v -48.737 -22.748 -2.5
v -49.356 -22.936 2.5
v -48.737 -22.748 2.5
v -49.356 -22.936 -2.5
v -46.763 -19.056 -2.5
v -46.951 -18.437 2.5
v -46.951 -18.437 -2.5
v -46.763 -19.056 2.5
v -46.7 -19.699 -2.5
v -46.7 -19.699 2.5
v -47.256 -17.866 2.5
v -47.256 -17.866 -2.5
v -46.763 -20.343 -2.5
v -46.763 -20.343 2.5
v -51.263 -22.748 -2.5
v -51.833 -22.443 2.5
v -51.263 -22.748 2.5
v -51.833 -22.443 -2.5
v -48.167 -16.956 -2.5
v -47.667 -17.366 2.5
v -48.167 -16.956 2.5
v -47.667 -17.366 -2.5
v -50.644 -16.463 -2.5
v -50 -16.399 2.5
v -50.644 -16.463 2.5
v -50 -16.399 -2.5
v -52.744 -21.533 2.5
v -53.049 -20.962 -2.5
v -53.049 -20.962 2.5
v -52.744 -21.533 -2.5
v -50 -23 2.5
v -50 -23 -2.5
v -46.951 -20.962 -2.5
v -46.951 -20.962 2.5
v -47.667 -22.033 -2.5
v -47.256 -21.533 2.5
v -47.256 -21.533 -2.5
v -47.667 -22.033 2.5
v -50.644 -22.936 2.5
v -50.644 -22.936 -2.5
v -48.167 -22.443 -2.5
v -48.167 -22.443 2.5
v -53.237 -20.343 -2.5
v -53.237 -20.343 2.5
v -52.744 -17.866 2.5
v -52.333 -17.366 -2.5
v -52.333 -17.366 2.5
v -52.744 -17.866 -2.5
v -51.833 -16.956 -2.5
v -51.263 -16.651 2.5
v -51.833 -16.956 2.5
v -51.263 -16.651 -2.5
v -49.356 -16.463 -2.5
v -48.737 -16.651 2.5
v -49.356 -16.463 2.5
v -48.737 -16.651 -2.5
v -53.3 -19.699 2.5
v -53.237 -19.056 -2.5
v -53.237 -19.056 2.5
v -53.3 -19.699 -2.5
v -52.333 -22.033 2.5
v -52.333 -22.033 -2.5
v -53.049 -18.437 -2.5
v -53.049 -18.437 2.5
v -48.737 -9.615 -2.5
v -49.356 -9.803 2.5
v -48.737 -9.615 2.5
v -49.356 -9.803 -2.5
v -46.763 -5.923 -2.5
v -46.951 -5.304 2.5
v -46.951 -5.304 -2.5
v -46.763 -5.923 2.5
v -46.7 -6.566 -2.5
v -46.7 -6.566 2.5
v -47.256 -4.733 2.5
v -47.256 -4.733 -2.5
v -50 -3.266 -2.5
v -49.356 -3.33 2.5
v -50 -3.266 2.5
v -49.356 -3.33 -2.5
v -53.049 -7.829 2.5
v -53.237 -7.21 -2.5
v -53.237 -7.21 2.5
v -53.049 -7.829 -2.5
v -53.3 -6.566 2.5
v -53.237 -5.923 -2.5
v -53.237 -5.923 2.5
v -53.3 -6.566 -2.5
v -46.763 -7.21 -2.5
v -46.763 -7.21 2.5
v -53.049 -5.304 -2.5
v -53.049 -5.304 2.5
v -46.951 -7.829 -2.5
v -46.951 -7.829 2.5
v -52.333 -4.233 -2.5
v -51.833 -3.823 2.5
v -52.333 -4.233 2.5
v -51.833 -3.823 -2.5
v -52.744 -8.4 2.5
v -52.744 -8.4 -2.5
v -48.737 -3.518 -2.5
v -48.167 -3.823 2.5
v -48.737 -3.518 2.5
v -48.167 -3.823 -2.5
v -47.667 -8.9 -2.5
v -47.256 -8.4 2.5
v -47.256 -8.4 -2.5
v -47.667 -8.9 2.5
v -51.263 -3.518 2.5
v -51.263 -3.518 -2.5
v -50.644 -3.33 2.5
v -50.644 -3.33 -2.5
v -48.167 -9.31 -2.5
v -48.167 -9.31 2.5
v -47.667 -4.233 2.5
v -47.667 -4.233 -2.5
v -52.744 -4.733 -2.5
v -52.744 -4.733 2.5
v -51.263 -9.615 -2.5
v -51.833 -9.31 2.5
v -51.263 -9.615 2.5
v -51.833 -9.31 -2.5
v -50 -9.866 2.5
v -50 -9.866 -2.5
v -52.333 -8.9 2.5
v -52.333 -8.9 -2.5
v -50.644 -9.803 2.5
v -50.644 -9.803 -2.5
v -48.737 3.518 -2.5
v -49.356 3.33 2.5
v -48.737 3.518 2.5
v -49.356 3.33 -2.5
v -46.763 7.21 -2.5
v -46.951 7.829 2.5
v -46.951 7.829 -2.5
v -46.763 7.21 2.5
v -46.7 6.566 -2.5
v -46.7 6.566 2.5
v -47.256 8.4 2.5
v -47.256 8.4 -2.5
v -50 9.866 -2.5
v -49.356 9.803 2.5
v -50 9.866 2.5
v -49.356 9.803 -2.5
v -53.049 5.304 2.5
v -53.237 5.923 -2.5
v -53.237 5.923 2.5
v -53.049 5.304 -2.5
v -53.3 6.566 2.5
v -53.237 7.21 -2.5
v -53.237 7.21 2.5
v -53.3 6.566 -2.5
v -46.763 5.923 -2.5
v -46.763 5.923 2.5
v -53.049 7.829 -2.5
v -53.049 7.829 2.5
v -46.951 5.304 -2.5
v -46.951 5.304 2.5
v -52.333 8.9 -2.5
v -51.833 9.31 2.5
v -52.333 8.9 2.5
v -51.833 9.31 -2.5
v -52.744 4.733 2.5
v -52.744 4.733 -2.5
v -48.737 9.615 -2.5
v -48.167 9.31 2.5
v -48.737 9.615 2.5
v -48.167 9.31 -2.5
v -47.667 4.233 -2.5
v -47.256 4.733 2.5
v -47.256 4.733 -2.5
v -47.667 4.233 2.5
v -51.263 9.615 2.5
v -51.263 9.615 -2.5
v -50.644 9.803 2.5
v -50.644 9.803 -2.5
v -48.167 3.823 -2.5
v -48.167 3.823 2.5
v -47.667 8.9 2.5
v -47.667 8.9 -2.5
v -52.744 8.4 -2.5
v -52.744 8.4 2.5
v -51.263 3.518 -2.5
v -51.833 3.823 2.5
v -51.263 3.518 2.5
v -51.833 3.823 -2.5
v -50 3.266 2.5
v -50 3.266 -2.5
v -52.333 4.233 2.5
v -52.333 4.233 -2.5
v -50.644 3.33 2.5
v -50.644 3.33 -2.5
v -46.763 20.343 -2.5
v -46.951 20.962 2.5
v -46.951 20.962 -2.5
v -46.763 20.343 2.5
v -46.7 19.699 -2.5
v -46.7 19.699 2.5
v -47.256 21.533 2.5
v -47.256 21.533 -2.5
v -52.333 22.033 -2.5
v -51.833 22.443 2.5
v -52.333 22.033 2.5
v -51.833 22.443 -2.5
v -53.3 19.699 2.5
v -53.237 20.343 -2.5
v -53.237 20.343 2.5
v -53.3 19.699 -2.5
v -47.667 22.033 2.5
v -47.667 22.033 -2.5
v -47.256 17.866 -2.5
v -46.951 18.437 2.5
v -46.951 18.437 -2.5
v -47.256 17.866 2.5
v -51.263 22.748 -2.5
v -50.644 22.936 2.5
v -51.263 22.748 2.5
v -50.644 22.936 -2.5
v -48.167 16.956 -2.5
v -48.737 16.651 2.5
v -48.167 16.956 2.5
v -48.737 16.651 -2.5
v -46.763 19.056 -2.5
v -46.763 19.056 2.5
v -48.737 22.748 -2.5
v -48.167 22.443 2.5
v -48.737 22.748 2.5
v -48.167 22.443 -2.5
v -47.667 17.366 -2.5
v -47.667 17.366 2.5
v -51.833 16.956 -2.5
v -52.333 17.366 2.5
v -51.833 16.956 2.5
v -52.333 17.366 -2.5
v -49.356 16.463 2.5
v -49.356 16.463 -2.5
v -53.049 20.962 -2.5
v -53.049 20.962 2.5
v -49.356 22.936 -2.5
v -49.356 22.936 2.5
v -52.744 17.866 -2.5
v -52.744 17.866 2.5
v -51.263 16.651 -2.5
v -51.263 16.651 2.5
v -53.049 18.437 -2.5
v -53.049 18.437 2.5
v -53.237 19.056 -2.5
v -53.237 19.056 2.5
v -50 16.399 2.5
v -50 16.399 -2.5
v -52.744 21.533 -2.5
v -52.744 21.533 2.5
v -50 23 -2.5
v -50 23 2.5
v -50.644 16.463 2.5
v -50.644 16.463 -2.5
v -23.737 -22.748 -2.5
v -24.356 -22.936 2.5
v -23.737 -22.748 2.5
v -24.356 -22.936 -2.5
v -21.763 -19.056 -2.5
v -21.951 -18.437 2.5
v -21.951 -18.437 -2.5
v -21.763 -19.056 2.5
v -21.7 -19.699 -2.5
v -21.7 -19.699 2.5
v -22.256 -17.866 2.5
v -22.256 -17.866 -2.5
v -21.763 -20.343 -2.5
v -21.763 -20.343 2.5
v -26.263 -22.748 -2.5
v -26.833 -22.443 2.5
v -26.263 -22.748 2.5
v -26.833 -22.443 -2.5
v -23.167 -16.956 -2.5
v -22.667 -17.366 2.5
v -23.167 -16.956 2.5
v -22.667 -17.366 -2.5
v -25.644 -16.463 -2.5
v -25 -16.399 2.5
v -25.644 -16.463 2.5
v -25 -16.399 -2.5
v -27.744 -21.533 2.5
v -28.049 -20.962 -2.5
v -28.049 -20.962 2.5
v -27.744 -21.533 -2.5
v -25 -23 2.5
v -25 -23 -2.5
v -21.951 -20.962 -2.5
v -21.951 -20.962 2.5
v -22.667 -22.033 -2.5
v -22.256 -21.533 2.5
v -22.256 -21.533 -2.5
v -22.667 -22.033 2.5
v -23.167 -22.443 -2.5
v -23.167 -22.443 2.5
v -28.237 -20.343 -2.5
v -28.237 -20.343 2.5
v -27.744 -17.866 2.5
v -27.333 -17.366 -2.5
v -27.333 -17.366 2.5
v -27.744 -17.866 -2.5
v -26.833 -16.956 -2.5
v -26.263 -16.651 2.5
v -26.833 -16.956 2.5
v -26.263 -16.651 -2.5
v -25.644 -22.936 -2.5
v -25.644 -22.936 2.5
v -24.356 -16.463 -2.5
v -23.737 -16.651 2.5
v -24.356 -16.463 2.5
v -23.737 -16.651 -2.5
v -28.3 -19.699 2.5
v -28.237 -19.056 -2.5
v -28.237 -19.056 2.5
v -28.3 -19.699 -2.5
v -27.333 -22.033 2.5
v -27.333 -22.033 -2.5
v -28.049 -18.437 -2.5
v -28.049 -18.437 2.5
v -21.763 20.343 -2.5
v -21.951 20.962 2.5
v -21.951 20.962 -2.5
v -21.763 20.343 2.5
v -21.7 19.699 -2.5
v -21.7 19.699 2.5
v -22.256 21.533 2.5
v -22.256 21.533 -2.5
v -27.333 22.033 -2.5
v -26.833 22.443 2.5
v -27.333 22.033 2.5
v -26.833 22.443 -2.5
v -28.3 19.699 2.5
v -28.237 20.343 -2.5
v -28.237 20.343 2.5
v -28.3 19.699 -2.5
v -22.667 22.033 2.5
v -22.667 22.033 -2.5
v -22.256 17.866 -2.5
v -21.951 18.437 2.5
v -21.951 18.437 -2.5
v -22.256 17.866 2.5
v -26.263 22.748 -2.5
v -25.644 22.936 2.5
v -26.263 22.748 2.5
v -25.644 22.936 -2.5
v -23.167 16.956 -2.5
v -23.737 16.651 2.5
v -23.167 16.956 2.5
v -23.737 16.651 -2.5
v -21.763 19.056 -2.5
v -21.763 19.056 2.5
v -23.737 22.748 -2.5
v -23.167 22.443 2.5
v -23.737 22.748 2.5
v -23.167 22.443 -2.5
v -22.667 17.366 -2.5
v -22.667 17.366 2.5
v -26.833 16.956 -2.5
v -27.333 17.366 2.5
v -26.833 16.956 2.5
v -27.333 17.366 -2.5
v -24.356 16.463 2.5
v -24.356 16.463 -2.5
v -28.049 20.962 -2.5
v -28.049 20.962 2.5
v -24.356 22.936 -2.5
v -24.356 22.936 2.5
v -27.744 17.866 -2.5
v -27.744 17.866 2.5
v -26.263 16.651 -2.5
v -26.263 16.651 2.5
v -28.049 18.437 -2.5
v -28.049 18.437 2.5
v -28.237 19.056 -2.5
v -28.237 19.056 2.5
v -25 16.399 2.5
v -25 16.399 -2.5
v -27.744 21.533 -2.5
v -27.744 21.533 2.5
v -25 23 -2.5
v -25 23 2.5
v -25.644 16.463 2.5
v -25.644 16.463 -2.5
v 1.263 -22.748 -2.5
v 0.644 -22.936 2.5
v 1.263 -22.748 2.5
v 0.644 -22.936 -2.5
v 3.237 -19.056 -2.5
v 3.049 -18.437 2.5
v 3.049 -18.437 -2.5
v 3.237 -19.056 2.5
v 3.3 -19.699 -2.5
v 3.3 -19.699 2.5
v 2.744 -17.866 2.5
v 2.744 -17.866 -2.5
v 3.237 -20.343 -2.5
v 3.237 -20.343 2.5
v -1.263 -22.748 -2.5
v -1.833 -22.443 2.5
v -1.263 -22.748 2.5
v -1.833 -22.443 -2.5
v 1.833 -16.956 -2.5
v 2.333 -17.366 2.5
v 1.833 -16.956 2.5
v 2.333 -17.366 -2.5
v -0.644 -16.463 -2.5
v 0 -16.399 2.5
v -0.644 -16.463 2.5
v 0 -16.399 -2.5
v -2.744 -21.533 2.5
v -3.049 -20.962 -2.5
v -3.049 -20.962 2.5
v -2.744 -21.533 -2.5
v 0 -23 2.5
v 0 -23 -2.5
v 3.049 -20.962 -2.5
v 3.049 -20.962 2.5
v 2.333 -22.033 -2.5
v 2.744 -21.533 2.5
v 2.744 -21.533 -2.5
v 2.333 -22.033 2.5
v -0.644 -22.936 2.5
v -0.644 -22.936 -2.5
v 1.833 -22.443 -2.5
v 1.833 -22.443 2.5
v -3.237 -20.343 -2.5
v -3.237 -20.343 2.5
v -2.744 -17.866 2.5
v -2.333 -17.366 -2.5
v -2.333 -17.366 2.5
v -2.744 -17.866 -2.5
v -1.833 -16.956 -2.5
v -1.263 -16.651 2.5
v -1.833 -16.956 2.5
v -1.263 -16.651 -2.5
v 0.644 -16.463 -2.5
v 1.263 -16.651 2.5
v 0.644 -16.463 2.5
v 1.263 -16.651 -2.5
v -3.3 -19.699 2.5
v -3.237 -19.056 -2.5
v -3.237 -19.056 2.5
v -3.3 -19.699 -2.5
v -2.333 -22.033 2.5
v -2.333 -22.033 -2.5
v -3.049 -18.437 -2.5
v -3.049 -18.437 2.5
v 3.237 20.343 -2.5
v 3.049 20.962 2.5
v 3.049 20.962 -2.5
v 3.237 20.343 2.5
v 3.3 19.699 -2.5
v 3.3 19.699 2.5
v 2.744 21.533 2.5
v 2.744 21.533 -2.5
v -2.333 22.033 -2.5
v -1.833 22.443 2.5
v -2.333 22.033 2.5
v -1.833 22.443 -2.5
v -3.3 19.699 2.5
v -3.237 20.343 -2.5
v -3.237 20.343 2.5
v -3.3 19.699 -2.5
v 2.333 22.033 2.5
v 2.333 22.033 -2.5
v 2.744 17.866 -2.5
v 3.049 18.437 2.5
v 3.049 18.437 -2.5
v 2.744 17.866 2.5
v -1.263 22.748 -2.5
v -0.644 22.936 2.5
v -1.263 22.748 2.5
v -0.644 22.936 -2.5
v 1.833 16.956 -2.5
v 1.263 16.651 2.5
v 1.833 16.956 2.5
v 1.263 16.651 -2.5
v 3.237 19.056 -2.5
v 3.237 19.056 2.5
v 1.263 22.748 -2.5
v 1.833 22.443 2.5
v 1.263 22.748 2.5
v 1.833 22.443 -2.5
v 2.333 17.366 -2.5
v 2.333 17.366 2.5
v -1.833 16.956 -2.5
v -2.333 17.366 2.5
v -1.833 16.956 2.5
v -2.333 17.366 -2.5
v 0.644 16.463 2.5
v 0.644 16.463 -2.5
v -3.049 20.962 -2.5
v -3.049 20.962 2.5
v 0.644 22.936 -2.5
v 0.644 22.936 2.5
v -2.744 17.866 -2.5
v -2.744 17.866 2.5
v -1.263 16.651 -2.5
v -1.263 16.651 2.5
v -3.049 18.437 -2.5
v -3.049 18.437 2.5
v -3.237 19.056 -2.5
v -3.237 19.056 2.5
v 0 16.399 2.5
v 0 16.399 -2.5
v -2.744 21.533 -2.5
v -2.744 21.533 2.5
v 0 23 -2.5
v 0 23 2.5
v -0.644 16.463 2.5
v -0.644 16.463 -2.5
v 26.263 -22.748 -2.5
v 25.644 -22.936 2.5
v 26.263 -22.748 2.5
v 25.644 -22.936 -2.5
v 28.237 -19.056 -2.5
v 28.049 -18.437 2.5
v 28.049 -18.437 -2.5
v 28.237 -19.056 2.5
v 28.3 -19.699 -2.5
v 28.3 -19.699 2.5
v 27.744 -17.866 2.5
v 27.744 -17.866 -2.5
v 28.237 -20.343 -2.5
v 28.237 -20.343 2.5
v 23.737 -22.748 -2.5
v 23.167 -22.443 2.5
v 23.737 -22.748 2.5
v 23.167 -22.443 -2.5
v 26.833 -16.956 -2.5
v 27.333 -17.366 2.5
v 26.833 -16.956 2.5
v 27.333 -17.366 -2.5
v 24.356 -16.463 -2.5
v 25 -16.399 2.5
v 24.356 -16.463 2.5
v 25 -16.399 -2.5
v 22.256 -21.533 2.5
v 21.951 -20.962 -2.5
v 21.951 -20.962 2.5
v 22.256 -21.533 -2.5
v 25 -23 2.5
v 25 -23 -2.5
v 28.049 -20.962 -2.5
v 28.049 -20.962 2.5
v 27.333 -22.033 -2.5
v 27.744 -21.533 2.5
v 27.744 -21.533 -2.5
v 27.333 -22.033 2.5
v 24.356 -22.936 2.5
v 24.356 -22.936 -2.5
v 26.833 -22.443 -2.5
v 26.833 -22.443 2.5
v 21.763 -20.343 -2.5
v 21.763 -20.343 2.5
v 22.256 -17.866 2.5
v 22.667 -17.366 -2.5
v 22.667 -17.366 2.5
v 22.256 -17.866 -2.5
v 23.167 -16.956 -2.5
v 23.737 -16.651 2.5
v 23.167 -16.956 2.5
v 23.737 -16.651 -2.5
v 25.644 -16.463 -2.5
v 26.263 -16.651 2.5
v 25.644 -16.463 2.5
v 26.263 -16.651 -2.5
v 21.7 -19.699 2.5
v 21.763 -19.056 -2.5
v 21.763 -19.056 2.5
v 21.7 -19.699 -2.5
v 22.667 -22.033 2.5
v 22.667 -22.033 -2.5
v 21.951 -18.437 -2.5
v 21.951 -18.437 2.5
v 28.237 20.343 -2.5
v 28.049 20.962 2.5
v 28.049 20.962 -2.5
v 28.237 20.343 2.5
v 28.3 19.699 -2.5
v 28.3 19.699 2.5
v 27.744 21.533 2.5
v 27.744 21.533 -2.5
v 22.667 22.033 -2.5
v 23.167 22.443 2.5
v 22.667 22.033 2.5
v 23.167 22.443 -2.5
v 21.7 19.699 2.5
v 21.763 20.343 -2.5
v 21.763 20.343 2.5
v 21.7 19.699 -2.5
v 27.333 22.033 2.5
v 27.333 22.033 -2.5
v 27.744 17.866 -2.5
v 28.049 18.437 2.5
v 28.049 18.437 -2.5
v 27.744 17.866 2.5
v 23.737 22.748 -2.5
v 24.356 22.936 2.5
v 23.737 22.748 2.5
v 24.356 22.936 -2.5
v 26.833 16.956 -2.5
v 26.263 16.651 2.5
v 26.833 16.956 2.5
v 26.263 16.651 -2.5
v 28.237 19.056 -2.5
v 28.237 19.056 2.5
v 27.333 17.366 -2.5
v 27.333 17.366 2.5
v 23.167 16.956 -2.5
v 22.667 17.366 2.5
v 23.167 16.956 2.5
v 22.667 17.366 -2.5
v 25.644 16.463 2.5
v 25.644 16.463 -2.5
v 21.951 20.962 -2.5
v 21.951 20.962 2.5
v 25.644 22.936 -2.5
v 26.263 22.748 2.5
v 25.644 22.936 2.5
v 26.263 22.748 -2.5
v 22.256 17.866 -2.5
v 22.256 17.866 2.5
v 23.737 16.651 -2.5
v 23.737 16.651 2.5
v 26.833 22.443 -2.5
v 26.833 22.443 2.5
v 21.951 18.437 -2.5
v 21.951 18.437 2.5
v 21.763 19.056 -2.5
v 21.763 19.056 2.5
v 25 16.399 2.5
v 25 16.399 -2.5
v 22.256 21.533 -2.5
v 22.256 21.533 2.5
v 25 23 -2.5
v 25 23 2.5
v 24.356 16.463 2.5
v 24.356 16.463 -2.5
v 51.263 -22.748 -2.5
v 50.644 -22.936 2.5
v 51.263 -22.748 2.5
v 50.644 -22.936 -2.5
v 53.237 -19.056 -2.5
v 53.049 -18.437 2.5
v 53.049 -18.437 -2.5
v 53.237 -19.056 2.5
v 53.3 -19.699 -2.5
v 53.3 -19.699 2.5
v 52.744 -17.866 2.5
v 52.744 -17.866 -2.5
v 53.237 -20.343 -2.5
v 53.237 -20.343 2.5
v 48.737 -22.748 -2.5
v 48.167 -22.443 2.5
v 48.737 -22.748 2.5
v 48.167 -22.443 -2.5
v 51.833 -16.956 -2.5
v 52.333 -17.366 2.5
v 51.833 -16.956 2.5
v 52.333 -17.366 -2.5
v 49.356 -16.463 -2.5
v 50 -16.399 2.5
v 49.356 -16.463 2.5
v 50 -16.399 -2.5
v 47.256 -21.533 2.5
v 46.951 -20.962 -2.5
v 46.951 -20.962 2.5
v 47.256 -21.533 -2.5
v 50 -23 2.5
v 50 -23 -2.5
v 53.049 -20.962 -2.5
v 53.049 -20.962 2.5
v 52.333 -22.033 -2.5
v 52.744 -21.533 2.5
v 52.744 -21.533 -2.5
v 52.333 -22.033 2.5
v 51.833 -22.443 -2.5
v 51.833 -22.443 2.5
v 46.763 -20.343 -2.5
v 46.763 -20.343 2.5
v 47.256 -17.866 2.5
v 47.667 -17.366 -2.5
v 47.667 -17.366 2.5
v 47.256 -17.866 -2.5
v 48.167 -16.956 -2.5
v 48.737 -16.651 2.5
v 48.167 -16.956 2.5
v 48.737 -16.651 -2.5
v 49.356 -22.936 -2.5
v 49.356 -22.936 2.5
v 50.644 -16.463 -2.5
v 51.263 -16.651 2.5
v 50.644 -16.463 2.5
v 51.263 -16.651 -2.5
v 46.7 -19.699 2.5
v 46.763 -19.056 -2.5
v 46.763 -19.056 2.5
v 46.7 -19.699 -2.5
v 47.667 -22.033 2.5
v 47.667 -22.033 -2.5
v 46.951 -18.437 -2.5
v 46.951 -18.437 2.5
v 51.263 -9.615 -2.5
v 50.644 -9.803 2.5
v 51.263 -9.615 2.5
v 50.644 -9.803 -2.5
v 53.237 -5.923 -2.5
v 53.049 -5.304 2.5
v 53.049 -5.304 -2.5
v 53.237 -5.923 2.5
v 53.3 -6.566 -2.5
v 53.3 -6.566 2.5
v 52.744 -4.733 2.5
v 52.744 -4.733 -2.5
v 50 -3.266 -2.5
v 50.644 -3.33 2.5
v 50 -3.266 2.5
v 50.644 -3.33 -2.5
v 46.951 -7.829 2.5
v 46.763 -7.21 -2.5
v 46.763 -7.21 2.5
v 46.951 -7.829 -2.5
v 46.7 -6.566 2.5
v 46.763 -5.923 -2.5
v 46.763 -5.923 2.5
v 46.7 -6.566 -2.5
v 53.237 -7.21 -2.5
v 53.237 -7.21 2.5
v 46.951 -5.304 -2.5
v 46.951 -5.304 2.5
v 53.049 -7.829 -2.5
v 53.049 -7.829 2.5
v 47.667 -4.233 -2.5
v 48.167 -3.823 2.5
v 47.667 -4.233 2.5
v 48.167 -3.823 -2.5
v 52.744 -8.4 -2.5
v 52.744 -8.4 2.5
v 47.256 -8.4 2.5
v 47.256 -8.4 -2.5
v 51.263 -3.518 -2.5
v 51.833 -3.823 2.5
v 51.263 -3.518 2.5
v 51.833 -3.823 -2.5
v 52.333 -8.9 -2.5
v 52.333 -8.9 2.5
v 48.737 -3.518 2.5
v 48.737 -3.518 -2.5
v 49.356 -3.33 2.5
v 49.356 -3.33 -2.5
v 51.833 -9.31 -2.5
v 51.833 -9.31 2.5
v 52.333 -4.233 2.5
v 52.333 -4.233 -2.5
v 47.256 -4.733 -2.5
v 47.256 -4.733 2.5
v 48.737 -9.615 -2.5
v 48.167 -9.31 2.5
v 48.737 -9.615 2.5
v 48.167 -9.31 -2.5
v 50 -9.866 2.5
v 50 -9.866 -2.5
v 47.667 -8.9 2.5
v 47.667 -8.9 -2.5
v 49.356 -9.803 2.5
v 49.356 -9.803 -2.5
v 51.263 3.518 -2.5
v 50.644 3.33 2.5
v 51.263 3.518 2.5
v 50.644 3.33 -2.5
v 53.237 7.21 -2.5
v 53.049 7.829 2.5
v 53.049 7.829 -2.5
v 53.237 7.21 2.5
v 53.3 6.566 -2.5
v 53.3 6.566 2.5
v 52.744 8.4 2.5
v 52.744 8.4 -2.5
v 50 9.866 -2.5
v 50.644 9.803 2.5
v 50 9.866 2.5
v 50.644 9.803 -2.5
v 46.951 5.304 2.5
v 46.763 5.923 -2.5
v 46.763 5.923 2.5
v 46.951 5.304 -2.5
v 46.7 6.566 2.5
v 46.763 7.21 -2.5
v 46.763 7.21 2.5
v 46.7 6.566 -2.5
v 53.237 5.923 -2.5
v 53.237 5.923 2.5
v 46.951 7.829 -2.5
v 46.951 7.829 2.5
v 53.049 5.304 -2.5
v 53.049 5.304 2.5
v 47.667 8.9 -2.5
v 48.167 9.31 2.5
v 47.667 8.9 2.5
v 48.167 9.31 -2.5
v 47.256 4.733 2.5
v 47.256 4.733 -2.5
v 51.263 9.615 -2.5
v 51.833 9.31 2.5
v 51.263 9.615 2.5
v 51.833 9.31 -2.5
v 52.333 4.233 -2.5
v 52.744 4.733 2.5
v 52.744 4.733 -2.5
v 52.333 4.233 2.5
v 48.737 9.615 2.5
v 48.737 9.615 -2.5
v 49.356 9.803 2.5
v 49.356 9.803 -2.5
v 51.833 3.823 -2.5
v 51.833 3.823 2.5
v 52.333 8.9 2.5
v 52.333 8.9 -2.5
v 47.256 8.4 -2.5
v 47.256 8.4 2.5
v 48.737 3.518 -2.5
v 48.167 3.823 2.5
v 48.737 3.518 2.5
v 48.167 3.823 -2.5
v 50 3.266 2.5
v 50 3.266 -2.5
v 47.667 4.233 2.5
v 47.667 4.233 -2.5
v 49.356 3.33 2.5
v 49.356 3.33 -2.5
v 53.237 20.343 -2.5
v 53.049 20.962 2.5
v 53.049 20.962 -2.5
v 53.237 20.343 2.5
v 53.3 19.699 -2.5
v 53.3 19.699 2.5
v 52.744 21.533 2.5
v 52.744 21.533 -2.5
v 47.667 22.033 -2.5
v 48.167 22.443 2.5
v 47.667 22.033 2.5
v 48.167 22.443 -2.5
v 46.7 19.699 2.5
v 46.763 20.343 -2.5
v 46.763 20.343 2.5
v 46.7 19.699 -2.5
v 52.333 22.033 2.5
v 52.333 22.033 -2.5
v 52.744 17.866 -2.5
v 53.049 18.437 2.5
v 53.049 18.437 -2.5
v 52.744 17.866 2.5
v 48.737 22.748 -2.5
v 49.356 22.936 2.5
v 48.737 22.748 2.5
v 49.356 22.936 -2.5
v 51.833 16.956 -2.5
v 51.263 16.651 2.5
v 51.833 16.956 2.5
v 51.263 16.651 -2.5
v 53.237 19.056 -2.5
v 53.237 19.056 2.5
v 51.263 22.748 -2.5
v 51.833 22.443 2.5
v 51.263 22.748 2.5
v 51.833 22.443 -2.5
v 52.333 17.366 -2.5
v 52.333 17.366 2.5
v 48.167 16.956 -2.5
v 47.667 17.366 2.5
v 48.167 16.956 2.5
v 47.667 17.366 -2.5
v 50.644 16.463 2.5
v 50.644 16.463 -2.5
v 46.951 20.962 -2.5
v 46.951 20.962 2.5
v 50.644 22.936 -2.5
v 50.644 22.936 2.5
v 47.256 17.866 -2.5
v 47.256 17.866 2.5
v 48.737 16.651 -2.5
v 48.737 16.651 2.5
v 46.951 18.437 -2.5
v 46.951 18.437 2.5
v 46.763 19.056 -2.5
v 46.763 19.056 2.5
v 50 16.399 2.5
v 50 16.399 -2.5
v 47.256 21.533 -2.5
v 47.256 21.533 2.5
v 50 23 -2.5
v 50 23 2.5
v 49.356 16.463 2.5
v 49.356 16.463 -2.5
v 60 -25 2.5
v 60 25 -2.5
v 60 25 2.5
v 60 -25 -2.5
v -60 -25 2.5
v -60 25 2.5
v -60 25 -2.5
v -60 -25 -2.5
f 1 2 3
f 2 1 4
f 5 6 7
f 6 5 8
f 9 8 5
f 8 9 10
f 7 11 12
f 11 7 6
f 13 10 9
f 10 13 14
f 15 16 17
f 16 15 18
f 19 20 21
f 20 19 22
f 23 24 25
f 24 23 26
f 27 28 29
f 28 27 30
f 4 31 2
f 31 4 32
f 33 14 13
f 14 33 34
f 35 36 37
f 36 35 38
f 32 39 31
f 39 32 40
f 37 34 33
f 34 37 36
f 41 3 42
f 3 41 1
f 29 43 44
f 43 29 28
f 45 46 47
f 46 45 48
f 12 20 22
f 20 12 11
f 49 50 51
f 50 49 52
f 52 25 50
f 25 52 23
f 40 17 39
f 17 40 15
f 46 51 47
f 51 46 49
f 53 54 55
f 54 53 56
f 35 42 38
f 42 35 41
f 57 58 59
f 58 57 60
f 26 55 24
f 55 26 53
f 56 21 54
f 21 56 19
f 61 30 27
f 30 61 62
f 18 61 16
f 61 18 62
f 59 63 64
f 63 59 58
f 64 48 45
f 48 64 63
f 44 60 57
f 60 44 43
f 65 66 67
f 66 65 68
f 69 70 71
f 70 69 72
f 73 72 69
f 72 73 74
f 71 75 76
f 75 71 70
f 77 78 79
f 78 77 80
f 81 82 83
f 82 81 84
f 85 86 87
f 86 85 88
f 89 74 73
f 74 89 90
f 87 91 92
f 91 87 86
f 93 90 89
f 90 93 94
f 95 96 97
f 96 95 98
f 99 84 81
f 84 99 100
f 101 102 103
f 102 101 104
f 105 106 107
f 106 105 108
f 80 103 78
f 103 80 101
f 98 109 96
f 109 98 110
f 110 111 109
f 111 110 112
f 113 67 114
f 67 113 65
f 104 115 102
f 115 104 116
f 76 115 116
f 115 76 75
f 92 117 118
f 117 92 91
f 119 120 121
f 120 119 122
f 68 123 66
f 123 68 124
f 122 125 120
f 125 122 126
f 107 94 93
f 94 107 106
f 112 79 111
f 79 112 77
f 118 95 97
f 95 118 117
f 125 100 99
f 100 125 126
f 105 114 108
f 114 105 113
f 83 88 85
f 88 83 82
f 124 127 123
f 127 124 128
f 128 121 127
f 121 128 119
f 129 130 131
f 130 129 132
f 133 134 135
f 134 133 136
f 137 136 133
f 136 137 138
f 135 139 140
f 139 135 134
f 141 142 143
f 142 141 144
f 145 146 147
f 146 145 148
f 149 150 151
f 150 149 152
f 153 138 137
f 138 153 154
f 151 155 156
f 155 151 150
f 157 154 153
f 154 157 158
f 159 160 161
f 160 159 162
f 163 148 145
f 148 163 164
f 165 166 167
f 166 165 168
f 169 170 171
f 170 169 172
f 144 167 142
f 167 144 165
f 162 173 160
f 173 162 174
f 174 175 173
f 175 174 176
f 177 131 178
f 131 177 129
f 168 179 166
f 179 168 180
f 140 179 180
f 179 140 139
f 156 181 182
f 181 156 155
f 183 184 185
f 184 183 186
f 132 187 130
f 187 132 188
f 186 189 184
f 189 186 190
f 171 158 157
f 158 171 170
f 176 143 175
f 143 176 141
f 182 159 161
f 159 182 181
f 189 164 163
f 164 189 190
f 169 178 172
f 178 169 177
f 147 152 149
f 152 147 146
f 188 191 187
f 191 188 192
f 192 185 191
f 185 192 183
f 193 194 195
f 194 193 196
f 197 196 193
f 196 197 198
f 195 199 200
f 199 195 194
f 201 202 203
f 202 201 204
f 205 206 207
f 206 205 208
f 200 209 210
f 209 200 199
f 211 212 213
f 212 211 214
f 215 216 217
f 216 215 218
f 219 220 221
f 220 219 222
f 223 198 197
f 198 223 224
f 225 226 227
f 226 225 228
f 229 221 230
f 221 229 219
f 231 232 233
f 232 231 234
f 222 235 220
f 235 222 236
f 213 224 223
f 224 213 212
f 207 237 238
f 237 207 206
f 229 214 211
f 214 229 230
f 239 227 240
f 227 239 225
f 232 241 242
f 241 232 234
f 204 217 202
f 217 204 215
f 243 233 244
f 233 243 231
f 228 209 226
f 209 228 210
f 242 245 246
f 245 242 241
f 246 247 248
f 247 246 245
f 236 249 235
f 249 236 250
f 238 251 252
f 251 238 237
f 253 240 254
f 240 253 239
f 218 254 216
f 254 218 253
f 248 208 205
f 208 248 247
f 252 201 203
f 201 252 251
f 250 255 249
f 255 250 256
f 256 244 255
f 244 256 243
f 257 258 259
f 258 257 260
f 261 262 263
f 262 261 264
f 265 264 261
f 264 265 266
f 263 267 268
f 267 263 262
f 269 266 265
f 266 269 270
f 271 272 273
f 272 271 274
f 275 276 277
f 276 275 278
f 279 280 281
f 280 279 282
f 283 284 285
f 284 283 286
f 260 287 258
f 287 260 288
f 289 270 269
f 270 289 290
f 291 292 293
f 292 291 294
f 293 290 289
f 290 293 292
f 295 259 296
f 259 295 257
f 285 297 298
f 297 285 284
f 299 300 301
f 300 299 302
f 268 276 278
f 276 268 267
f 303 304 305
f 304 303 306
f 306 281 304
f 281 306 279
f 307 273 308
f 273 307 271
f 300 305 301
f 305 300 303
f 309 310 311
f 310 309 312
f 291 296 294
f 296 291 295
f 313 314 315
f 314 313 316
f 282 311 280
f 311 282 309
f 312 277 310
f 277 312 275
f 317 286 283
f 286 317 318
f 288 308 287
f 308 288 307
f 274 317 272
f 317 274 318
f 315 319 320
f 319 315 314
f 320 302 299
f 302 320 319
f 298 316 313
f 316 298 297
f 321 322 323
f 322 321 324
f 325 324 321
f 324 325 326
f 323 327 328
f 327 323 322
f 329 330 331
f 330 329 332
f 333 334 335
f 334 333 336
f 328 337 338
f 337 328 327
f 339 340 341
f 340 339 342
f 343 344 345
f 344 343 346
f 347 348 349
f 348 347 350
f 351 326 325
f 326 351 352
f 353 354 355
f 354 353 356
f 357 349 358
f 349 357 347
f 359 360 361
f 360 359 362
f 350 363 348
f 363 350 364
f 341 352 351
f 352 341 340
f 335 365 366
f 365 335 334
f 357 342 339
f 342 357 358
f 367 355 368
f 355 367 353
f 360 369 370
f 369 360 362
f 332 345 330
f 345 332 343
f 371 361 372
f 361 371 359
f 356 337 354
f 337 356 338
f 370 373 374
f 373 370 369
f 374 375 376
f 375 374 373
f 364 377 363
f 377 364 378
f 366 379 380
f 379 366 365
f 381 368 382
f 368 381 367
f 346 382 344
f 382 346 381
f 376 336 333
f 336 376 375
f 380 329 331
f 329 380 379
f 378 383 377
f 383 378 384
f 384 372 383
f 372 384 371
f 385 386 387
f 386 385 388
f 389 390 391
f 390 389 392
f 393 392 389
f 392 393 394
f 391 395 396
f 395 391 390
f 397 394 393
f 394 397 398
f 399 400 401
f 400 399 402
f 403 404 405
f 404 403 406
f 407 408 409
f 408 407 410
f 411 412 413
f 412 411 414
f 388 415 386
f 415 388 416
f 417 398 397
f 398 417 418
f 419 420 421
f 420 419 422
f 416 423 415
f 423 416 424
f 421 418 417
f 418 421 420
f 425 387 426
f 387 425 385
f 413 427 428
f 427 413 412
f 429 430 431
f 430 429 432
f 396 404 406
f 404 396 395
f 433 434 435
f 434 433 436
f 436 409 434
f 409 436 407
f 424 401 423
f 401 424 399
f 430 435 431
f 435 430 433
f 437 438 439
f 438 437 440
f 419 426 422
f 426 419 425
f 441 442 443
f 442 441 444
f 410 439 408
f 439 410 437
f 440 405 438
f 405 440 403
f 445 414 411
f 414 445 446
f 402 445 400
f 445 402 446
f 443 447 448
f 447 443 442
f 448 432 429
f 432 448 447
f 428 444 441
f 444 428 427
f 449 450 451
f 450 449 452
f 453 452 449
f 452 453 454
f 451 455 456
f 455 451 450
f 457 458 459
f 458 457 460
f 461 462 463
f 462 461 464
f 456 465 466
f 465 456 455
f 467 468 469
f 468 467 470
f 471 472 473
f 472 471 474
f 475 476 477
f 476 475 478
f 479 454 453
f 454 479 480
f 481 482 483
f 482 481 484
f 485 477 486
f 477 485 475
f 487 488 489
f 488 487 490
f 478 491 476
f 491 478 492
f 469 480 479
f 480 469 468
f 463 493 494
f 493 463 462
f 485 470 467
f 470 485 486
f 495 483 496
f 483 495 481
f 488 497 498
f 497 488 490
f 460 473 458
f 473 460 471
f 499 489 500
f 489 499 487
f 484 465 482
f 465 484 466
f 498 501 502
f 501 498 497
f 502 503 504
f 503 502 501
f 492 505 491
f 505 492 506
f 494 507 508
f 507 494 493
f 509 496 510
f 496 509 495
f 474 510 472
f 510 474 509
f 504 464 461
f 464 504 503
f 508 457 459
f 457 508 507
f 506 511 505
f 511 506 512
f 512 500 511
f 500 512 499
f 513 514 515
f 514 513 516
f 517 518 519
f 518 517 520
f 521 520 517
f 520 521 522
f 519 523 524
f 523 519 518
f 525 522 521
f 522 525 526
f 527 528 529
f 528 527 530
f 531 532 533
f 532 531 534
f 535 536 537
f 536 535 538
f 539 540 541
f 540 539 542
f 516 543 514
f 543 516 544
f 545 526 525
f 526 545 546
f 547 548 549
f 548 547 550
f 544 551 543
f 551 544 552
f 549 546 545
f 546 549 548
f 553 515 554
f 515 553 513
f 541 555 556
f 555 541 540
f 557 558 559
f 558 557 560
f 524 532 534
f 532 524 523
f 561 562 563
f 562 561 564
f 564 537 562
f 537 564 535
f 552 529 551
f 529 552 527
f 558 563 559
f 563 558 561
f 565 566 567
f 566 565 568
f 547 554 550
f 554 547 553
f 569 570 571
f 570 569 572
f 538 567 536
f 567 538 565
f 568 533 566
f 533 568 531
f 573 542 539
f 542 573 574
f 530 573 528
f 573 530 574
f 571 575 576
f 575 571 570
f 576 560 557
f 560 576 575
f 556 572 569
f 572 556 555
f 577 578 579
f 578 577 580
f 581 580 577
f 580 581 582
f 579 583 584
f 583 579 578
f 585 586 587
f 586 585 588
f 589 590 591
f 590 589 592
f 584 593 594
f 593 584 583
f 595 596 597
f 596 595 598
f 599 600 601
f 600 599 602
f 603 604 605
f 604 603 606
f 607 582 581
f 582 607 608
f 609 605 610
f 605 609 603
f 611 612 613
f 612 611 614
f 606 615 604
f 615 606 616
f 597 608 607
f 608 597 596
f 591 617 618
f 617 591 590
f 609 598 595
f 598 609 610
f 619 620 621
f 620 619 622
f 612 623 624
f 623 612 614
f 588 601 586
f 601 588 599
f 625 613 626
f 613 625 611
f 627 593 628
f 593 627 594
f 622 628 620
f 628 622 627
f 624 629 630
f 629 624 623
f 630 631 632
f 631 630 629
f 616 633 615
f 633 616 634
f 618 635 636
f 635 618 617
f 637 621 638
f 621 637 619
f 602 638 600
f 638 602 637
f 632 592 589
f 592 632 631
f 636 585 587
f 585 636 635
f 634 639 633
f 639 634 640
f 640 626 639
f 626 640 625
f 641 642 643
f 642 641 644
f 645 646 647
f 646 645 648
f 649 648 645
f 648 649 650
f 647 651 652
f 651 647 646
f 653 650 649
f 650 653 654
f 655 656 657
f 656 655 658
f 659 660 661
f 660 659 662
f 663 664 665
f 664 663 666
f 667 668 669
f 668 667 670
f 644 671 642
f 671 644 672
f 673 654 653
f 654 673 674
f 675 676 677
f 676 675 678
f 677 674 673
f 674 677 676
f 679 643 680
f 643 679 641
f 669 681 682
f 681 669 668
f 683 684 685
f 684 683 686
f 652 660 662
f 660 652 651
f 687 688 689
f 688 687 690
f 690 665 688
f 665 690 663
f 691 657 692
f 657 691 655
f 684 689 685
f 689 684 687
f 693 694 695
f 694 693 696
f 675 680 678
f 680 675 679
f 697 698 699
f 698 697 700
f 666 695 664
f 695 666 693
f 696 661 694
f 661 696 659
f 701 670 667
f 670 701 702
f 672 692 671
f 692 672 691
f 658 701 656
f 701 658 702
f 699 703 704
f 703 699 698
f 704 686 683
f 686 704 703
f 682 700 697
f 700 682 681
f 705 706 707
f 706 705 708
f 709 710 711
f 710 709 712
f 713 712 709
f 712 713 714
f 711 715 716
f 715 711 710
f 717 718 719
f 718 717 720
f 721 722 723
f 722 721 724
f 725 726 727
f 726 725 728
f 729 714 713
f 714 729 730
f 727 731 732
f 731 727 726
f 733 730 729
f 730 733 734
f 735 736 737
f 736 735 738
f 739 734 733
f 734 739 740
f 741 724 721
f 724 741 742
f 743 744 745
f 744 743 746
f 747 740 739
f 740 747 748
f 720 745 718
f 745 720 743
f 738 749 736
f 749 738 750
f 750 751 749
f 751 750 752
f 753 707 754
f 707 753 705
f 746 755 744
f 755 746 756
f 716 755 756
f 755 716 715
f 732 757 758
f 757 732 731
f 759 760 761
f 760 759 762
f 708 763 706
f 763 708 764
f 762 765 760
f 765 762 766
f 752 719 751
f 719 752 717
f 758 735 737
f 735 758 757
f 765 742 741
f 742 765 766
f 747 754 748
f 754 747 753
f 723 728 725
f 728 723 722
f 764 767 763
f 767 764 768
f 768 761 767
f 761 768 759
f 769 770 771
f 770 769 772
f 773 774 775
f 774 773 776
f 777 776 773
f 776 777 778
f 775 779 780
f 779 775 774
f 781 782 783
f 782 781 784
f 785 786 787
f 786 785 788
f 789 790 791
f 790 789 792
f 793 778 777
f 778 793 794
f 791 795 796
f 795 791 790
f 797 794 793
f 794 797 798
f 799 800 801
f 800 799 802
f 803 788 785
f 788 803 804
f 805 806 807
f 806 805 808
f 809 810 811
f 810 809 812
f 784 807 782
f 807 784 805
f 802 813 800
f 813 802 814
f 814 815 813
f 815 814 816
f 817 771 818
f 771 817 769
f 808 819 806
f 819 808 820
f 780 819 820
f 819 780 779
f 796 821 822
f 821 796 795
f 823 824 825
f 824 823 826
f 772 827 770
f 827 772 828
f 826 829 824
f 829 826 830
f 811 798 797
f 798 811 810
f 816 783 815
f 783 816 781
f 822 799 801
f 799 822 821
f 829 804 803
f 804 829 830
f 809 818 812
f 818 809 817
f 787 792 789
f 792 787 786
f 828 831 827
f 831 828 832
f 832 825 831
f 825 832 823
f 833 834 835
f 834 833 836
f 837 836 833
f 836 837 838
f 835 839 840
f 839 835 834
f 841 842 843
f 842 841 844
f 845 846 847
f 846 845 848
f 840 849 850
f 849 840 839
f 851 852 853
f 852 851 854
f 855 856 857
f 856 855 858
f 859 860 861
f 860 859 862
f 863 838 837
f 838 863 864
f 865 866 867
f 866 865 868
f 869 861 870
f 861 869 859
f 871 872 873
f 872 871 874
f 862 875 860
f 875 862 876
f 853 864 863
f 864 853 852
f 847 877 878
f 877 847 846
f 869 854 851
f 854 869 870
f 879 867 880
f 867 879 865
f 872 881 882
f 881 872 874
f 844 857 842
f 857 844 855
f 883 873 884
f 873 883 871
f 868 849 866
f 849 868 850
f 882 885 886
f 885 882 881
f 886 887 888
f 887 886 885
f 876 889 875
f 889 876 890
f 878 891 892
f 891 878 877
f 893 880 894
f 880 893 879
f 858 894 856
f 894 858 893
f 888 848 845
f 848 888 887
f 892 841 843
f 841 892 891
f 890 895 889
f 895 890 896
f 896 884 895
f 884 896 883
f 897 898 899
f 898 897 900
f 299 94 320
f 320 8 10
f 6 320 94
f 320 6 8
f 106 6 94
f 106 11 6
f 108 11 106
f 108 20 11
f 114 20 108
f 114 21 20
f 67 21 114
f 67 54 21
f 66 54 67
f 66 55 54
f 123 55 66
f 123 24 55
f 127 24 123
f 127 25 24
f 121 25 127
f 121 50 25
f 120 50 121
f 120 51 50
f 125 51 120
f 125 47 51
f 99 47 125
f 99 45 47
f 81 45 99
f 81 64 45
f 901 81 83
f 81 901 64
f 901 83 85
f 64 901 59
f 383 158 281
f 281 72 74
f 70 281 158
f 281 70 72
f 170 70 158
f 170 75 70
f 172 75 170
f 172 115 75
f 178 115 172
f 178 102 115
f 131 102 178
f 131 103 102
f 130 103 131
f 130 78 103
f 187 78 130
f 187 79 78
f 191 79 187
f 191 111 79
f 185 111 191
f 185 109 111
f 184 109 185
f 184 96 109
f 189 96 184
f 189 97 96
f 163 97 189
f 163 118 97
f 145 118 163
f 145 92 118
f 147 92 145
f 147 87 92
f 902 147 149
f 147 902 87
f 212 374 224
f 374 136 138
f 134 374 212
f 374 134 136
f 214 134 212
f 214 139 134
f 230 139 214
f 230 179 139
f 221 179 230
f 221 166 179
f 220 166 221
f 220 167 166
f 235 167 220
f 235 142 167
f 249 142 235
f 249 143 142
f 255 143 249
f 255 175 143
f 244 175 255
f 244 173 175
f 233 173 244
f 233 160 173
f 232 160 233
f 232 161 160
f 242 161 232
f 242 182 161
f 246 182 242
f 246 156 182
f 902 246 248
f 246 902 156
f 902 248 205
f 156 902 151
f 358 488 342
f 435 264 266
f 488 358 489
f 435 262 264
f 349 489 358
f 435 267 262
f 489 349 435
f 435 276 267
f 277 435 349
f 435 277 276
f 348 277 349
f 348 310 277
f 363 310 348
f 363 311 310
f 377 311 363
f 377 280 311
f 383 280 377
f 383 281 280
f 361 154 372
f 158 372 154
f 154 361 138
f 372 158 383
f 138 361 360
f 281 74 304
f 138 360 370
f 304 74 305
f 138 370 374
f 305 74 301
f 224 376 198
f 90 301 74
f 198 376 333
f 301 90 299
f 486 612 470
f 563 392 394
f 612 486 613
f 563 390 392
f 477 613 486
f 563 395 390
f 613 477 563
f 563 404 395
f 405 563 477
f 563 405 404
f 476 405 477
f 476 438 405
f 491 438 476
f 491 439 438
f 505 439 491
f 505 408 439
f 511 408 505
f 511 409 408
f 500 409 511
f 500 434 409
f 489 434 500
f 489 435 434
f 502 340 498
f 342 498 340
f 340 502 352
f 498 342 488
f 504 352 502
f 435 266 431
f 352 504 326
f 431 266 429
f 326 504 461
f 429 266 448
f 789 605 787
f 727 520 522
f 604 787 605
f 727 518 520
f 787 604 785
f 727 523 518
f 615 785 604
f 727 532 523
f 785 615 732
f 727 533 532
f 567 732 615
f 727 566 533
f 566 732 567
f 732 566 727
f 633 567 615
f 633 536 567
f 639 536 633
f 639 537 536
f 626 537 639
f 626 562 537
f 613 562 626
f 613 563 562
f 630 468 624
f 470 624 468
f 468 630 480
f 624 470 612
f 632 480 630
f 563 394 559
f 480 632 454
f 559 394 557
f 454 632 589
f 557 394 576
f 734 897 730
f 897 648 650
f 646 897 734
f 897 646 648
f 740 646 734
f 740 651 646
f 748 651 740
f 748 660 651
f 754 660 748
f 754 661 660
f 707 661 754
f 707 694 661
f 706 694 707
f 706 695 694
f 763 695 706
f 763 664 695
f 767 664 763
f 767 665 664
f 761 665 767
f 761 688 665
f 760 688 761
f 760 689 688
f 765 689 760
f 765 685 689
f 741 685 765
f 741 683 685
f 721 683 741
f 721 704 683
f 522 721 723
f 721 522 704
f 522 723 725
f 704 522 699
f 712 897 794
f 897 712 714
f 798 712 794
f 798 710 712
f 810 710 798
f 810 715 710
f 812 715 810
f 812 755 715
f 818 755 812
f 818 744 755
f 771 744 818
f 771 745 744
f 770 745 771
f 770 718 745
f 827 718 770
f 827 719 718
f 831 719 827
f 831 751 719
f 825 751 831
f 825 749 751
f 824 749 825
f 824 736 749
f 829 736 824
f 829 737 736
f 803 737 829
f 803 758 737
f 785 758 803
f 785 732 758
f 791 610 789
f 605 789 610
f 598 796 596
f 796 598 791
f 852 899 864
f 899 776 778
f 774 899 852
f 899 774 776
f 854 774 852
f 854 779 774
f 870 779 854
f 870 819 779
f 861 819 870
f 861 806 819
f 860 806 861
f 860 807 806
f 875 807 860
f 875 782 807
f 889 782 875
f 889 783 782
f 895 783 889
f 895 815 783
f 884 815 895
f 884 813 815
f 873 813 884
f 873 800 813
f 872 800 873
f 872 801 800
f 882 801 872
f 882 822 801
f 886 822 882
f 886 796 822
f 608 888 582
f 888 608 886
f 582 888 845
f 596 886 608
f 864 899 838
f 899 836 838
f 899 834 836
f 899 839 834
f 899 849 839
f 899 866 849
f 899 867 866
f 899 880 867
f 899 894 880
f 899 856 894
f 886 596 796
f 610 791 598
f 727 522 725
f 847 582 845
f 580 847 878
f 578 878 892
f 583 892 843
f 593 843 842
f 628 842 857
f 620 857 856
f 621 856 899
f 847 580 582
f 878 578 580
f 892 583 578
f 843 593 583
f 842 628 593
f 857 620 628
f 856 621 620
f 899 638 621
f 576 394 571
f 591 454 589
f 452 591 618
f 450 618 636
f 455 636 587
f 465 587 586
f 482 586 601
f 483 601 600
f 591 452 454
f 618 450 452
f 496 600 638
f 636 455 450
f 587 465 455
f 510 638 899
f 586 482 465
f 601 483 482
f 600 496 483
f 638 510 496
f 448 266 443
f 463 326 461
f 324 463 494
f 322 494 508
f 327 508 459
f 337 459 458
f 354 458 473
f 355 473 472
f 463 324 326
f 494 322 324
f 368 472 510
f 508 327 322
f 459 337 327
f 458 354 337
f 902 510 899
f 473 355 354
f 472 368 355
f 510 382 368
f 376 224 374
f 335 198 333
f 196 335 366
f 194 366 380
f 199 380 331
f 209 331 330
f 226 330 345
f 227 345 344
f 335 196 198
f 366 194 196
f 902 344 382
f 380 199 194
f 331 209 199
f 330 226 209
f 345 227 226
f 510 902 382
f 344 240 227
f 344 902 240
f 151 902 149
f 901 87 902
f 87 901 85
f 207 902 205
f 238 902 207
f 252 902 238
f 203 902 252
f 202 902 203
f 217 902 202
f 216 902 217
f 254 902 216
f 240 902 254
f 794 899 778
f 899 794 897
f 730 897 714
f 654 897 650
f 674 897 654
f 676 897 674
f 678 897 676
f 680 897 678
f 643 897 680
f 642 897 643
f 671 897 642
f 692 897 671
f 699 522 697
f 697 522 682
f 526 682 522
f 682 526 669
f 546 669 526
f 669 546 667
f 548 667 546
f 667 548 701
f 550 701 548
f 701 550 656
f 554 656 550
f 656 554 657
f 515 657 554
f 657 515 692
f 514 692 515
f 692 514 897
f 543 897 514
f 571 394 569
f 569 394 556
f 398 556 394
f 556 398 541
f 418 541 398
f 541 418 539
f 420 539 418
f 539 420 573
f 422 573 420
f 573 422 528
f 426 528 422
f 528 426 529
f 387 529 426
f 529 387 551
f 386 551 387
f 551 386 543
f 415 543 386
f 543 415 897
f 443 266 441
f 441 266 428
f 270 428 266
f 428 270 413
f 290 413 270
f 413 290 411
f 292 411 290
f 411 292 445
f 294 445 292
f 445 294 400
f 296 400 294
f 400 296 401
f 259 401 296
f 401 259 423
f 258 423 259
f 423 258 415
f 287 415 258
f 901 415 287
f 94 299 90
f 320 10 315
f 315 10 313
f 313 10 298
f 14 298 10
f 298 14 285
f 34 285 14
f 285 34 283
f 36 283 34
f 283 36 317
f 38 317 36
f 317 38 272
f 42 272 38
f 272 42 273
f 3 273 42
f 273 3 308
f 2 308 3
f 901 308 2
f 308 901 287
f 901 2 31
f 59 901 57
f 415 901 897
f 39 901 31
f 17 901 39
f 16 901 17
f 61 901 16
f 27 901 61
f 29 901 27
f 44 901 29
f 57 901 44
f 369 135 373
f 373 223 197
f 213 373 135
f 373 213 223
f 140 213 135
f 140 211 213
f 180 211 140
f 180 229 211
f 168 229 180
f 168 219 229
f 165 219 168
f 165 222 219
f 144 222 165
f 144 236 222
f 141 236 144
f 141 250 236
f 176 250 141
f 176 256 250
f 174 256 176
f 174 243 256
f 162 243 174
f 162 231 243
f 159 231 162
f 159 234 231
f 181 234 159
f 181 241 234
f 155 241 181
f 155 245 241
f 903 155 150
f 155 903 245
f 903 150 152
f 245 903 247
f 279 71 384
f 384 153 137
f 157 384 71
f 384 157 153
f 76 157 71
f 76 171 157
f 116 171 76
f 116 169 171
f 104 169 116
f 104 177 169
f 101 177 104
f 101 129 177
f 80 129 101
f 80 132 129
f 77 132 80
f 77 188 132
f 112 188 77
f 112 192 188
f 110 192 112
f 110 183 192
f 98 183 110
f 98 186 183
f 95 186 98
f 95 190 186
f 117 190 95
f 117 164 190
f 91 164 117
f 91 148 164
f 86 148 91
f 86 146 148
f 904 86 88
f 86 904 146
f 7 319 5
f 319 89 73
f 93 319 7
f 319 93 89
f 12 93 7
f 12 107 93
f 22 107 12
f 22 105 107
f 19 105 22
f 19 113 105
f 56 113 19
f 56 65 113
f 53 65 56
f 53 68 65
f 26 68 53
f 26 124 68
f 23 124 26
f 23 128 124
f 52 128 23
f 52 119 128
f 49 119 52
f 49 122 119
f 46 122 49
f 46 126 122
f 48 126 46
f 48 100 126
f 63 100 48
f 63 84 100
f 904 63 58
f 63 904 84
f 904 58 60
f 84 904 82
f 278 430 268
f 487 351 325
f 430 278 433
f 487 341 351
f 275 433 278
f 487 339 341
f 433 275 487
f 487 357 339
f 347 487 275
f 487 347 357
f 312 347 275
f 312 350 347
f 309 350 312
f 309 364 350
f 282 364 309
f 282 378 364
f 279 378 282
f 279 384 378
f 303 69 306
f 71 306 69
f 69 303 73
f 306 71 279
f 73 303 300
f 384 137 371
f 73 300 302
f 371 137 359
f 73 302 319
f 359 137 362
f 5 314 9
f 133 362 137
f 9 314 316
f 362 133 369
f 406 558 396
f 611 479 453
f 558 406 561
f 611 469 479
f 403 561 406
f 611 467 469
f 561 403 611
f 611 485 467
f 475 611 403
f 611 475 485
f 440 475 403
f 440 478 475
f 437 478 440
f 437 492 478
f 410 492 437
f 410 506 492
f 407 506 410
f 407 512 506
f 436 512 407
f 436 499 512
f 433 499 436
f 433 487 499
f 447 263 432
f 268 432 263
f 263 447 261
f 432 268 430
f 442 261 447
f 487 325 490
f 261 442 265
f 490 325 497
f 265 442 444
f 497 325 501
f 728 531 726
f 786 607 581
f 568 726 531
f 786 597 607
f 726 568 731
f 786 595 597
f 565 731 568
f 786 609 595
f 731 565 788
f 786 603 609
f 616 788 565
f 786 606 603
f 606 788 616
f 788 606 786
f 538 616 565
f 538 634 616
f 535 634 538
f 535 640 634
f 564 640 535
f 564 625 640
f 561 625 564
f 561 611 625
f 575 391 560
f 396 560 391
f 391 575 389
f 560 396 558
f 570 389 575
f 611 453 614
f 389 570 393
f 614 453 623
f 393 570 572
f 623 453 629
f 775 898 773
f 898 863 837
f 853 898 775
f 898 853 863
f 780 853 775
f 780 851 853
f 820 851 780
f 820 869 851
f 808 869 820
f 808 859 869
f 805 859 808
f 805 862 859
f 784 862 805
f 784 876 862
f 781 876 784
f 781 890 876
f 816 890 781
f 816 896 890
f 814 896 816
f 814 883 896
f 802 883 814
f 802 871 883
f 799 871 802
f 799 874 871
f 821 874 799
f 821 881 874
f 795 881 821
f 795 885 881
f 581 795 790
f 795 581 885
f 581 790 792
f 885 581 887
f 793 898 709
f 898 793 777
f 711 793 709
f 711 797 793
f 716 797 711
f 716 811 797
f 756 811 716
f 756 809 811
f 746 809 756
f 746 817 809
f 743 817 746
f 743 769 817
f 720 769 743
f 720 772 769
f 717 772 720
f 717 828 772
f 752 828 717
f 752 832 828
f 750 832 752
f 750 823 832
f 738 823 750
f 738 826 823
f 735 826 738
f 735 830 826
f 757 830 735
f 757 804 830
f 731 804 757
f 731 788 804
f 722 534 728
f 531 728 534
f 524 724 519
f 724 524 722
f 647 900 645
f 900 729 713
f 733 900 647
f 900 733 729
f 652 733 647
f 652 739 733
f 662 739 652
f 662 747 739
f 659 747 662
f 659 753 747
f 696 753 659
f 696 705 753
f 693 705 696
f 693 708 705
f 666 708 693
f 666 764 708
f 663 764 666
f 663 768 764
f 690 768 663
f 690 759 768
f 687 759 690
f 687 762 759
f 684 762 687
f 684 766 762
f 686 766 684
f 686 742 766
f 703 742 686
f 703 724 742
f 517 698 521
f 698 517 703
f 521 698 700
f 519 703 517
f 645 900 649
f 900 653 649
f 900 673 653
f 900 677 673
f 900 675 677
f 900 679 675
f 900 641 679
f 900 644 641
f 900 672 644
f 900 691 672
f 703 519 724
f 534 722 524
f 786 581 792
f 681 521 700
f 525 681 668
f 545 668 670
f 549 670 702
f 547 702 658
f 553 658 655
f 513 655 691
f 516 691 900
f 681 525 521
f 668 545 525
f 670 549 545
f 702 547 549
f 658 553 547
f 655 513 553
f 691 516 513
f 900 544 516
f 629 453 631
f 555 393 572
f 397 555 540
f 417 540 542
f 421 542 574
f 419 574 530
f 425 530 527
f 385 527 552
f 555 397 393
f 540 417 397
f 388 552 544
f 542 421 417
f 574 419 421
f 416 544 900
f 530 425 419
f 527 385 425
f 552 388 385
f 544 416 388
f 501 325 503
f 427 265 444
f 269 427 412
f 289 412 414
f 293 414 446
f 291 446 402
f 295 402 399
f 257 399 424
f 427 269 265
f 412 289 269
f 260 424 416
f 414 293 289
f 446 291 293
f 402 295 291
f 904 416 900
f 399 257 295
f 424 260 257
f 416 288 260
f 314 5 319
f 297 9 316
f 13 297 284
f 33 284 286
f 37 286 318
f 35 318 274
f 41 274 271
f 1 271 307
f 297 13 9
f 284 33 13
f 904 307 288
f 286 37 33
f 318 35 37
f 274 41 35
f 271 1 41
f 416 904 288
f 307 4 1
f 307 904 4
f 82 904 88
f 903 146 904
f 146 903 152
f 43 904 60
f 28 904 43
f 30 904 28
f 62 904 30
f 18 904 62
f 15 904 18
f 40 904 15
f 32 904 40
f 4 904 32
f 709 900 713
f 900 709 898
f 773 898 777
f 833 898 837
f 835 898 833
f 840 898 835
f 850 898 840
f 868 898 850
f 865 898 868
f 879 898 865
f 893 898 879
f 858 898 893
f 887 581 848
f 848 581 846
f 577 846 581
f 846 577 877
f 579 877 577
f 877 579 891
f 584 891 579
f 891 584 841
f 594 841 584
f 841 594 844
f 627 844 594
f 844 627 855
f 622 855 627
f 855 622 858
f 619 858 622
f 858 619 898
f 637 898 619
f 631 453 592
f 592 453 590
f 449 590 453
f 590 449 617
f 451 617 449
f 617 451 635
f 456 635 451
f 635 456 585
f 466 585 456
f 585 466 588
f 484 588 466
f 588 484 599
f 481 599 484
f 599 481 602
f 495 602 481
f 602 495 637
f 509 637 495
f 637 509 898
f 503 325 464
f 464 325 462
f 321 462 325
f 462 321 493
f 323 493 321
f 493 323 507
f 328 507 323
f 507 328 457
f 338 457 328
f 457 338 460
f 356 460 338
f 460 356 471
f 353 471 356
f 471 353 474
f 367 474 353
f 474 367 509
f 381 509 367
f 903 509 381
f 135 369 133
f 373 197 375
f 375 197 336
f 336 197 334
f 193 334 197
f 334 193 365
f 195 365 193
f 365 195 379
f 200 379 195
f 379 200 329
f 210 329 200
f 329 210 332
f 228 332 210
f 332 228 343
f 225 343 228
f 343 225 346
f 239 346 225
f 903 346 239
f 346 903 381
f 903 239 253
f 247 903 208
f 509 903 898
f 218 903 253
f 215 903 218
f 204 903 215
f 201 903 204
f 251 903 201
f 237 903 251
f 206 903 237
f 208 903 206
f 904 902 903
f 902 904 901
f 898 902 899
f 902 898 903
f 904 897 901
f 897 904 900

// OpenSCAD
$fn = 32;

// ----------------------------------------------------------------------
// Perforated panel 120 x 50 x 5
// 4 x 5 Ø6.6 holes, frame layout
// ----------------------------------------------------------------------

// --- parameters (mm) ---
panel = [120, 50, 5];  // overall size (x, y, z)
hole_d = 6.6;          // hole diameter
pitch_x = 25;          // hole pitch along X
pitch_y = 13.133;      // hole pitch along Y

// --- derived feature positions (mm) ---
margin = hole_d / 2 + 2;            // = 5.3   clearance from the panel edge
cols = floor((panel[0] - 2 * margin) / pitch_x) + 1;  // = 5   how many columns fit in X
rows = floor((panel[1] - 2 * margin) / pitch_y) + 1;  // = 4   how many rows fit in Y
span_x = (cols - 1) * pitch_x + 0;  // = 100   width of the field
span_y = (rows - 1) * pitch_y;      // = 39.4   height of the field
origin_x = -span_x / 2;             // = -50   X of the first hole
origin_y = -span_y / 2;             // = -19.7   Y of the first row
holes = 2 * cols + 2 * (rows - 2);  // = 14   holes around the frame
feature_centers = [
  [origin_x + 0 * pitch_x, origin_y + 0 * pitch_y],
  [origin_x + 0 * pitch_x, origin_y + 1 * pitch_y],
  [origin_x + 0 * pitch_x, origin_y + 2 * pitch_y],
  [origin_x + 0 * pitch_x, origin_y + 3 * pitch_y],
  [origin_x + 1 * pitch_x, origin_y + 0 * pitch_y],
  [origin_x + 1 * pitch_x, origin_y + 3 * pitch_y],
  [origin_x + 2 * pitch_x, origin_y + 0 * pitch_y],
  [origin_x + 2 * pitch_x, origin_y + 3 * pitch_y],
  [origin_x + 3 * pitch_x, origin_y + 0 * pitch_y],
  [origin_x + 3 * pitch_x, origin_y + 3 * pitch_y],
  [origin_x + 4 * pitch_x, origin_y + 0 * pitch_y],
  [origin_x + 4 * pitch_x, origin_y + 1 * pitch_y],
  [origin_x + 4 * pitch_x, origin_y + 2 * pitch_y],
  [origin_x + 4 * pitch_x, origin_y + 3 * pitch_y]
];   // hole centres, used verbatim by the cutter loop

// panel outline, every hole through
difference() {
  cube(panel, center = true);
  for (centre = feature_centers)
    translate([centre[0], centre[1], 0])
      cylinder(d = hole_d, h = panel[2] + 2, center = true);
}
